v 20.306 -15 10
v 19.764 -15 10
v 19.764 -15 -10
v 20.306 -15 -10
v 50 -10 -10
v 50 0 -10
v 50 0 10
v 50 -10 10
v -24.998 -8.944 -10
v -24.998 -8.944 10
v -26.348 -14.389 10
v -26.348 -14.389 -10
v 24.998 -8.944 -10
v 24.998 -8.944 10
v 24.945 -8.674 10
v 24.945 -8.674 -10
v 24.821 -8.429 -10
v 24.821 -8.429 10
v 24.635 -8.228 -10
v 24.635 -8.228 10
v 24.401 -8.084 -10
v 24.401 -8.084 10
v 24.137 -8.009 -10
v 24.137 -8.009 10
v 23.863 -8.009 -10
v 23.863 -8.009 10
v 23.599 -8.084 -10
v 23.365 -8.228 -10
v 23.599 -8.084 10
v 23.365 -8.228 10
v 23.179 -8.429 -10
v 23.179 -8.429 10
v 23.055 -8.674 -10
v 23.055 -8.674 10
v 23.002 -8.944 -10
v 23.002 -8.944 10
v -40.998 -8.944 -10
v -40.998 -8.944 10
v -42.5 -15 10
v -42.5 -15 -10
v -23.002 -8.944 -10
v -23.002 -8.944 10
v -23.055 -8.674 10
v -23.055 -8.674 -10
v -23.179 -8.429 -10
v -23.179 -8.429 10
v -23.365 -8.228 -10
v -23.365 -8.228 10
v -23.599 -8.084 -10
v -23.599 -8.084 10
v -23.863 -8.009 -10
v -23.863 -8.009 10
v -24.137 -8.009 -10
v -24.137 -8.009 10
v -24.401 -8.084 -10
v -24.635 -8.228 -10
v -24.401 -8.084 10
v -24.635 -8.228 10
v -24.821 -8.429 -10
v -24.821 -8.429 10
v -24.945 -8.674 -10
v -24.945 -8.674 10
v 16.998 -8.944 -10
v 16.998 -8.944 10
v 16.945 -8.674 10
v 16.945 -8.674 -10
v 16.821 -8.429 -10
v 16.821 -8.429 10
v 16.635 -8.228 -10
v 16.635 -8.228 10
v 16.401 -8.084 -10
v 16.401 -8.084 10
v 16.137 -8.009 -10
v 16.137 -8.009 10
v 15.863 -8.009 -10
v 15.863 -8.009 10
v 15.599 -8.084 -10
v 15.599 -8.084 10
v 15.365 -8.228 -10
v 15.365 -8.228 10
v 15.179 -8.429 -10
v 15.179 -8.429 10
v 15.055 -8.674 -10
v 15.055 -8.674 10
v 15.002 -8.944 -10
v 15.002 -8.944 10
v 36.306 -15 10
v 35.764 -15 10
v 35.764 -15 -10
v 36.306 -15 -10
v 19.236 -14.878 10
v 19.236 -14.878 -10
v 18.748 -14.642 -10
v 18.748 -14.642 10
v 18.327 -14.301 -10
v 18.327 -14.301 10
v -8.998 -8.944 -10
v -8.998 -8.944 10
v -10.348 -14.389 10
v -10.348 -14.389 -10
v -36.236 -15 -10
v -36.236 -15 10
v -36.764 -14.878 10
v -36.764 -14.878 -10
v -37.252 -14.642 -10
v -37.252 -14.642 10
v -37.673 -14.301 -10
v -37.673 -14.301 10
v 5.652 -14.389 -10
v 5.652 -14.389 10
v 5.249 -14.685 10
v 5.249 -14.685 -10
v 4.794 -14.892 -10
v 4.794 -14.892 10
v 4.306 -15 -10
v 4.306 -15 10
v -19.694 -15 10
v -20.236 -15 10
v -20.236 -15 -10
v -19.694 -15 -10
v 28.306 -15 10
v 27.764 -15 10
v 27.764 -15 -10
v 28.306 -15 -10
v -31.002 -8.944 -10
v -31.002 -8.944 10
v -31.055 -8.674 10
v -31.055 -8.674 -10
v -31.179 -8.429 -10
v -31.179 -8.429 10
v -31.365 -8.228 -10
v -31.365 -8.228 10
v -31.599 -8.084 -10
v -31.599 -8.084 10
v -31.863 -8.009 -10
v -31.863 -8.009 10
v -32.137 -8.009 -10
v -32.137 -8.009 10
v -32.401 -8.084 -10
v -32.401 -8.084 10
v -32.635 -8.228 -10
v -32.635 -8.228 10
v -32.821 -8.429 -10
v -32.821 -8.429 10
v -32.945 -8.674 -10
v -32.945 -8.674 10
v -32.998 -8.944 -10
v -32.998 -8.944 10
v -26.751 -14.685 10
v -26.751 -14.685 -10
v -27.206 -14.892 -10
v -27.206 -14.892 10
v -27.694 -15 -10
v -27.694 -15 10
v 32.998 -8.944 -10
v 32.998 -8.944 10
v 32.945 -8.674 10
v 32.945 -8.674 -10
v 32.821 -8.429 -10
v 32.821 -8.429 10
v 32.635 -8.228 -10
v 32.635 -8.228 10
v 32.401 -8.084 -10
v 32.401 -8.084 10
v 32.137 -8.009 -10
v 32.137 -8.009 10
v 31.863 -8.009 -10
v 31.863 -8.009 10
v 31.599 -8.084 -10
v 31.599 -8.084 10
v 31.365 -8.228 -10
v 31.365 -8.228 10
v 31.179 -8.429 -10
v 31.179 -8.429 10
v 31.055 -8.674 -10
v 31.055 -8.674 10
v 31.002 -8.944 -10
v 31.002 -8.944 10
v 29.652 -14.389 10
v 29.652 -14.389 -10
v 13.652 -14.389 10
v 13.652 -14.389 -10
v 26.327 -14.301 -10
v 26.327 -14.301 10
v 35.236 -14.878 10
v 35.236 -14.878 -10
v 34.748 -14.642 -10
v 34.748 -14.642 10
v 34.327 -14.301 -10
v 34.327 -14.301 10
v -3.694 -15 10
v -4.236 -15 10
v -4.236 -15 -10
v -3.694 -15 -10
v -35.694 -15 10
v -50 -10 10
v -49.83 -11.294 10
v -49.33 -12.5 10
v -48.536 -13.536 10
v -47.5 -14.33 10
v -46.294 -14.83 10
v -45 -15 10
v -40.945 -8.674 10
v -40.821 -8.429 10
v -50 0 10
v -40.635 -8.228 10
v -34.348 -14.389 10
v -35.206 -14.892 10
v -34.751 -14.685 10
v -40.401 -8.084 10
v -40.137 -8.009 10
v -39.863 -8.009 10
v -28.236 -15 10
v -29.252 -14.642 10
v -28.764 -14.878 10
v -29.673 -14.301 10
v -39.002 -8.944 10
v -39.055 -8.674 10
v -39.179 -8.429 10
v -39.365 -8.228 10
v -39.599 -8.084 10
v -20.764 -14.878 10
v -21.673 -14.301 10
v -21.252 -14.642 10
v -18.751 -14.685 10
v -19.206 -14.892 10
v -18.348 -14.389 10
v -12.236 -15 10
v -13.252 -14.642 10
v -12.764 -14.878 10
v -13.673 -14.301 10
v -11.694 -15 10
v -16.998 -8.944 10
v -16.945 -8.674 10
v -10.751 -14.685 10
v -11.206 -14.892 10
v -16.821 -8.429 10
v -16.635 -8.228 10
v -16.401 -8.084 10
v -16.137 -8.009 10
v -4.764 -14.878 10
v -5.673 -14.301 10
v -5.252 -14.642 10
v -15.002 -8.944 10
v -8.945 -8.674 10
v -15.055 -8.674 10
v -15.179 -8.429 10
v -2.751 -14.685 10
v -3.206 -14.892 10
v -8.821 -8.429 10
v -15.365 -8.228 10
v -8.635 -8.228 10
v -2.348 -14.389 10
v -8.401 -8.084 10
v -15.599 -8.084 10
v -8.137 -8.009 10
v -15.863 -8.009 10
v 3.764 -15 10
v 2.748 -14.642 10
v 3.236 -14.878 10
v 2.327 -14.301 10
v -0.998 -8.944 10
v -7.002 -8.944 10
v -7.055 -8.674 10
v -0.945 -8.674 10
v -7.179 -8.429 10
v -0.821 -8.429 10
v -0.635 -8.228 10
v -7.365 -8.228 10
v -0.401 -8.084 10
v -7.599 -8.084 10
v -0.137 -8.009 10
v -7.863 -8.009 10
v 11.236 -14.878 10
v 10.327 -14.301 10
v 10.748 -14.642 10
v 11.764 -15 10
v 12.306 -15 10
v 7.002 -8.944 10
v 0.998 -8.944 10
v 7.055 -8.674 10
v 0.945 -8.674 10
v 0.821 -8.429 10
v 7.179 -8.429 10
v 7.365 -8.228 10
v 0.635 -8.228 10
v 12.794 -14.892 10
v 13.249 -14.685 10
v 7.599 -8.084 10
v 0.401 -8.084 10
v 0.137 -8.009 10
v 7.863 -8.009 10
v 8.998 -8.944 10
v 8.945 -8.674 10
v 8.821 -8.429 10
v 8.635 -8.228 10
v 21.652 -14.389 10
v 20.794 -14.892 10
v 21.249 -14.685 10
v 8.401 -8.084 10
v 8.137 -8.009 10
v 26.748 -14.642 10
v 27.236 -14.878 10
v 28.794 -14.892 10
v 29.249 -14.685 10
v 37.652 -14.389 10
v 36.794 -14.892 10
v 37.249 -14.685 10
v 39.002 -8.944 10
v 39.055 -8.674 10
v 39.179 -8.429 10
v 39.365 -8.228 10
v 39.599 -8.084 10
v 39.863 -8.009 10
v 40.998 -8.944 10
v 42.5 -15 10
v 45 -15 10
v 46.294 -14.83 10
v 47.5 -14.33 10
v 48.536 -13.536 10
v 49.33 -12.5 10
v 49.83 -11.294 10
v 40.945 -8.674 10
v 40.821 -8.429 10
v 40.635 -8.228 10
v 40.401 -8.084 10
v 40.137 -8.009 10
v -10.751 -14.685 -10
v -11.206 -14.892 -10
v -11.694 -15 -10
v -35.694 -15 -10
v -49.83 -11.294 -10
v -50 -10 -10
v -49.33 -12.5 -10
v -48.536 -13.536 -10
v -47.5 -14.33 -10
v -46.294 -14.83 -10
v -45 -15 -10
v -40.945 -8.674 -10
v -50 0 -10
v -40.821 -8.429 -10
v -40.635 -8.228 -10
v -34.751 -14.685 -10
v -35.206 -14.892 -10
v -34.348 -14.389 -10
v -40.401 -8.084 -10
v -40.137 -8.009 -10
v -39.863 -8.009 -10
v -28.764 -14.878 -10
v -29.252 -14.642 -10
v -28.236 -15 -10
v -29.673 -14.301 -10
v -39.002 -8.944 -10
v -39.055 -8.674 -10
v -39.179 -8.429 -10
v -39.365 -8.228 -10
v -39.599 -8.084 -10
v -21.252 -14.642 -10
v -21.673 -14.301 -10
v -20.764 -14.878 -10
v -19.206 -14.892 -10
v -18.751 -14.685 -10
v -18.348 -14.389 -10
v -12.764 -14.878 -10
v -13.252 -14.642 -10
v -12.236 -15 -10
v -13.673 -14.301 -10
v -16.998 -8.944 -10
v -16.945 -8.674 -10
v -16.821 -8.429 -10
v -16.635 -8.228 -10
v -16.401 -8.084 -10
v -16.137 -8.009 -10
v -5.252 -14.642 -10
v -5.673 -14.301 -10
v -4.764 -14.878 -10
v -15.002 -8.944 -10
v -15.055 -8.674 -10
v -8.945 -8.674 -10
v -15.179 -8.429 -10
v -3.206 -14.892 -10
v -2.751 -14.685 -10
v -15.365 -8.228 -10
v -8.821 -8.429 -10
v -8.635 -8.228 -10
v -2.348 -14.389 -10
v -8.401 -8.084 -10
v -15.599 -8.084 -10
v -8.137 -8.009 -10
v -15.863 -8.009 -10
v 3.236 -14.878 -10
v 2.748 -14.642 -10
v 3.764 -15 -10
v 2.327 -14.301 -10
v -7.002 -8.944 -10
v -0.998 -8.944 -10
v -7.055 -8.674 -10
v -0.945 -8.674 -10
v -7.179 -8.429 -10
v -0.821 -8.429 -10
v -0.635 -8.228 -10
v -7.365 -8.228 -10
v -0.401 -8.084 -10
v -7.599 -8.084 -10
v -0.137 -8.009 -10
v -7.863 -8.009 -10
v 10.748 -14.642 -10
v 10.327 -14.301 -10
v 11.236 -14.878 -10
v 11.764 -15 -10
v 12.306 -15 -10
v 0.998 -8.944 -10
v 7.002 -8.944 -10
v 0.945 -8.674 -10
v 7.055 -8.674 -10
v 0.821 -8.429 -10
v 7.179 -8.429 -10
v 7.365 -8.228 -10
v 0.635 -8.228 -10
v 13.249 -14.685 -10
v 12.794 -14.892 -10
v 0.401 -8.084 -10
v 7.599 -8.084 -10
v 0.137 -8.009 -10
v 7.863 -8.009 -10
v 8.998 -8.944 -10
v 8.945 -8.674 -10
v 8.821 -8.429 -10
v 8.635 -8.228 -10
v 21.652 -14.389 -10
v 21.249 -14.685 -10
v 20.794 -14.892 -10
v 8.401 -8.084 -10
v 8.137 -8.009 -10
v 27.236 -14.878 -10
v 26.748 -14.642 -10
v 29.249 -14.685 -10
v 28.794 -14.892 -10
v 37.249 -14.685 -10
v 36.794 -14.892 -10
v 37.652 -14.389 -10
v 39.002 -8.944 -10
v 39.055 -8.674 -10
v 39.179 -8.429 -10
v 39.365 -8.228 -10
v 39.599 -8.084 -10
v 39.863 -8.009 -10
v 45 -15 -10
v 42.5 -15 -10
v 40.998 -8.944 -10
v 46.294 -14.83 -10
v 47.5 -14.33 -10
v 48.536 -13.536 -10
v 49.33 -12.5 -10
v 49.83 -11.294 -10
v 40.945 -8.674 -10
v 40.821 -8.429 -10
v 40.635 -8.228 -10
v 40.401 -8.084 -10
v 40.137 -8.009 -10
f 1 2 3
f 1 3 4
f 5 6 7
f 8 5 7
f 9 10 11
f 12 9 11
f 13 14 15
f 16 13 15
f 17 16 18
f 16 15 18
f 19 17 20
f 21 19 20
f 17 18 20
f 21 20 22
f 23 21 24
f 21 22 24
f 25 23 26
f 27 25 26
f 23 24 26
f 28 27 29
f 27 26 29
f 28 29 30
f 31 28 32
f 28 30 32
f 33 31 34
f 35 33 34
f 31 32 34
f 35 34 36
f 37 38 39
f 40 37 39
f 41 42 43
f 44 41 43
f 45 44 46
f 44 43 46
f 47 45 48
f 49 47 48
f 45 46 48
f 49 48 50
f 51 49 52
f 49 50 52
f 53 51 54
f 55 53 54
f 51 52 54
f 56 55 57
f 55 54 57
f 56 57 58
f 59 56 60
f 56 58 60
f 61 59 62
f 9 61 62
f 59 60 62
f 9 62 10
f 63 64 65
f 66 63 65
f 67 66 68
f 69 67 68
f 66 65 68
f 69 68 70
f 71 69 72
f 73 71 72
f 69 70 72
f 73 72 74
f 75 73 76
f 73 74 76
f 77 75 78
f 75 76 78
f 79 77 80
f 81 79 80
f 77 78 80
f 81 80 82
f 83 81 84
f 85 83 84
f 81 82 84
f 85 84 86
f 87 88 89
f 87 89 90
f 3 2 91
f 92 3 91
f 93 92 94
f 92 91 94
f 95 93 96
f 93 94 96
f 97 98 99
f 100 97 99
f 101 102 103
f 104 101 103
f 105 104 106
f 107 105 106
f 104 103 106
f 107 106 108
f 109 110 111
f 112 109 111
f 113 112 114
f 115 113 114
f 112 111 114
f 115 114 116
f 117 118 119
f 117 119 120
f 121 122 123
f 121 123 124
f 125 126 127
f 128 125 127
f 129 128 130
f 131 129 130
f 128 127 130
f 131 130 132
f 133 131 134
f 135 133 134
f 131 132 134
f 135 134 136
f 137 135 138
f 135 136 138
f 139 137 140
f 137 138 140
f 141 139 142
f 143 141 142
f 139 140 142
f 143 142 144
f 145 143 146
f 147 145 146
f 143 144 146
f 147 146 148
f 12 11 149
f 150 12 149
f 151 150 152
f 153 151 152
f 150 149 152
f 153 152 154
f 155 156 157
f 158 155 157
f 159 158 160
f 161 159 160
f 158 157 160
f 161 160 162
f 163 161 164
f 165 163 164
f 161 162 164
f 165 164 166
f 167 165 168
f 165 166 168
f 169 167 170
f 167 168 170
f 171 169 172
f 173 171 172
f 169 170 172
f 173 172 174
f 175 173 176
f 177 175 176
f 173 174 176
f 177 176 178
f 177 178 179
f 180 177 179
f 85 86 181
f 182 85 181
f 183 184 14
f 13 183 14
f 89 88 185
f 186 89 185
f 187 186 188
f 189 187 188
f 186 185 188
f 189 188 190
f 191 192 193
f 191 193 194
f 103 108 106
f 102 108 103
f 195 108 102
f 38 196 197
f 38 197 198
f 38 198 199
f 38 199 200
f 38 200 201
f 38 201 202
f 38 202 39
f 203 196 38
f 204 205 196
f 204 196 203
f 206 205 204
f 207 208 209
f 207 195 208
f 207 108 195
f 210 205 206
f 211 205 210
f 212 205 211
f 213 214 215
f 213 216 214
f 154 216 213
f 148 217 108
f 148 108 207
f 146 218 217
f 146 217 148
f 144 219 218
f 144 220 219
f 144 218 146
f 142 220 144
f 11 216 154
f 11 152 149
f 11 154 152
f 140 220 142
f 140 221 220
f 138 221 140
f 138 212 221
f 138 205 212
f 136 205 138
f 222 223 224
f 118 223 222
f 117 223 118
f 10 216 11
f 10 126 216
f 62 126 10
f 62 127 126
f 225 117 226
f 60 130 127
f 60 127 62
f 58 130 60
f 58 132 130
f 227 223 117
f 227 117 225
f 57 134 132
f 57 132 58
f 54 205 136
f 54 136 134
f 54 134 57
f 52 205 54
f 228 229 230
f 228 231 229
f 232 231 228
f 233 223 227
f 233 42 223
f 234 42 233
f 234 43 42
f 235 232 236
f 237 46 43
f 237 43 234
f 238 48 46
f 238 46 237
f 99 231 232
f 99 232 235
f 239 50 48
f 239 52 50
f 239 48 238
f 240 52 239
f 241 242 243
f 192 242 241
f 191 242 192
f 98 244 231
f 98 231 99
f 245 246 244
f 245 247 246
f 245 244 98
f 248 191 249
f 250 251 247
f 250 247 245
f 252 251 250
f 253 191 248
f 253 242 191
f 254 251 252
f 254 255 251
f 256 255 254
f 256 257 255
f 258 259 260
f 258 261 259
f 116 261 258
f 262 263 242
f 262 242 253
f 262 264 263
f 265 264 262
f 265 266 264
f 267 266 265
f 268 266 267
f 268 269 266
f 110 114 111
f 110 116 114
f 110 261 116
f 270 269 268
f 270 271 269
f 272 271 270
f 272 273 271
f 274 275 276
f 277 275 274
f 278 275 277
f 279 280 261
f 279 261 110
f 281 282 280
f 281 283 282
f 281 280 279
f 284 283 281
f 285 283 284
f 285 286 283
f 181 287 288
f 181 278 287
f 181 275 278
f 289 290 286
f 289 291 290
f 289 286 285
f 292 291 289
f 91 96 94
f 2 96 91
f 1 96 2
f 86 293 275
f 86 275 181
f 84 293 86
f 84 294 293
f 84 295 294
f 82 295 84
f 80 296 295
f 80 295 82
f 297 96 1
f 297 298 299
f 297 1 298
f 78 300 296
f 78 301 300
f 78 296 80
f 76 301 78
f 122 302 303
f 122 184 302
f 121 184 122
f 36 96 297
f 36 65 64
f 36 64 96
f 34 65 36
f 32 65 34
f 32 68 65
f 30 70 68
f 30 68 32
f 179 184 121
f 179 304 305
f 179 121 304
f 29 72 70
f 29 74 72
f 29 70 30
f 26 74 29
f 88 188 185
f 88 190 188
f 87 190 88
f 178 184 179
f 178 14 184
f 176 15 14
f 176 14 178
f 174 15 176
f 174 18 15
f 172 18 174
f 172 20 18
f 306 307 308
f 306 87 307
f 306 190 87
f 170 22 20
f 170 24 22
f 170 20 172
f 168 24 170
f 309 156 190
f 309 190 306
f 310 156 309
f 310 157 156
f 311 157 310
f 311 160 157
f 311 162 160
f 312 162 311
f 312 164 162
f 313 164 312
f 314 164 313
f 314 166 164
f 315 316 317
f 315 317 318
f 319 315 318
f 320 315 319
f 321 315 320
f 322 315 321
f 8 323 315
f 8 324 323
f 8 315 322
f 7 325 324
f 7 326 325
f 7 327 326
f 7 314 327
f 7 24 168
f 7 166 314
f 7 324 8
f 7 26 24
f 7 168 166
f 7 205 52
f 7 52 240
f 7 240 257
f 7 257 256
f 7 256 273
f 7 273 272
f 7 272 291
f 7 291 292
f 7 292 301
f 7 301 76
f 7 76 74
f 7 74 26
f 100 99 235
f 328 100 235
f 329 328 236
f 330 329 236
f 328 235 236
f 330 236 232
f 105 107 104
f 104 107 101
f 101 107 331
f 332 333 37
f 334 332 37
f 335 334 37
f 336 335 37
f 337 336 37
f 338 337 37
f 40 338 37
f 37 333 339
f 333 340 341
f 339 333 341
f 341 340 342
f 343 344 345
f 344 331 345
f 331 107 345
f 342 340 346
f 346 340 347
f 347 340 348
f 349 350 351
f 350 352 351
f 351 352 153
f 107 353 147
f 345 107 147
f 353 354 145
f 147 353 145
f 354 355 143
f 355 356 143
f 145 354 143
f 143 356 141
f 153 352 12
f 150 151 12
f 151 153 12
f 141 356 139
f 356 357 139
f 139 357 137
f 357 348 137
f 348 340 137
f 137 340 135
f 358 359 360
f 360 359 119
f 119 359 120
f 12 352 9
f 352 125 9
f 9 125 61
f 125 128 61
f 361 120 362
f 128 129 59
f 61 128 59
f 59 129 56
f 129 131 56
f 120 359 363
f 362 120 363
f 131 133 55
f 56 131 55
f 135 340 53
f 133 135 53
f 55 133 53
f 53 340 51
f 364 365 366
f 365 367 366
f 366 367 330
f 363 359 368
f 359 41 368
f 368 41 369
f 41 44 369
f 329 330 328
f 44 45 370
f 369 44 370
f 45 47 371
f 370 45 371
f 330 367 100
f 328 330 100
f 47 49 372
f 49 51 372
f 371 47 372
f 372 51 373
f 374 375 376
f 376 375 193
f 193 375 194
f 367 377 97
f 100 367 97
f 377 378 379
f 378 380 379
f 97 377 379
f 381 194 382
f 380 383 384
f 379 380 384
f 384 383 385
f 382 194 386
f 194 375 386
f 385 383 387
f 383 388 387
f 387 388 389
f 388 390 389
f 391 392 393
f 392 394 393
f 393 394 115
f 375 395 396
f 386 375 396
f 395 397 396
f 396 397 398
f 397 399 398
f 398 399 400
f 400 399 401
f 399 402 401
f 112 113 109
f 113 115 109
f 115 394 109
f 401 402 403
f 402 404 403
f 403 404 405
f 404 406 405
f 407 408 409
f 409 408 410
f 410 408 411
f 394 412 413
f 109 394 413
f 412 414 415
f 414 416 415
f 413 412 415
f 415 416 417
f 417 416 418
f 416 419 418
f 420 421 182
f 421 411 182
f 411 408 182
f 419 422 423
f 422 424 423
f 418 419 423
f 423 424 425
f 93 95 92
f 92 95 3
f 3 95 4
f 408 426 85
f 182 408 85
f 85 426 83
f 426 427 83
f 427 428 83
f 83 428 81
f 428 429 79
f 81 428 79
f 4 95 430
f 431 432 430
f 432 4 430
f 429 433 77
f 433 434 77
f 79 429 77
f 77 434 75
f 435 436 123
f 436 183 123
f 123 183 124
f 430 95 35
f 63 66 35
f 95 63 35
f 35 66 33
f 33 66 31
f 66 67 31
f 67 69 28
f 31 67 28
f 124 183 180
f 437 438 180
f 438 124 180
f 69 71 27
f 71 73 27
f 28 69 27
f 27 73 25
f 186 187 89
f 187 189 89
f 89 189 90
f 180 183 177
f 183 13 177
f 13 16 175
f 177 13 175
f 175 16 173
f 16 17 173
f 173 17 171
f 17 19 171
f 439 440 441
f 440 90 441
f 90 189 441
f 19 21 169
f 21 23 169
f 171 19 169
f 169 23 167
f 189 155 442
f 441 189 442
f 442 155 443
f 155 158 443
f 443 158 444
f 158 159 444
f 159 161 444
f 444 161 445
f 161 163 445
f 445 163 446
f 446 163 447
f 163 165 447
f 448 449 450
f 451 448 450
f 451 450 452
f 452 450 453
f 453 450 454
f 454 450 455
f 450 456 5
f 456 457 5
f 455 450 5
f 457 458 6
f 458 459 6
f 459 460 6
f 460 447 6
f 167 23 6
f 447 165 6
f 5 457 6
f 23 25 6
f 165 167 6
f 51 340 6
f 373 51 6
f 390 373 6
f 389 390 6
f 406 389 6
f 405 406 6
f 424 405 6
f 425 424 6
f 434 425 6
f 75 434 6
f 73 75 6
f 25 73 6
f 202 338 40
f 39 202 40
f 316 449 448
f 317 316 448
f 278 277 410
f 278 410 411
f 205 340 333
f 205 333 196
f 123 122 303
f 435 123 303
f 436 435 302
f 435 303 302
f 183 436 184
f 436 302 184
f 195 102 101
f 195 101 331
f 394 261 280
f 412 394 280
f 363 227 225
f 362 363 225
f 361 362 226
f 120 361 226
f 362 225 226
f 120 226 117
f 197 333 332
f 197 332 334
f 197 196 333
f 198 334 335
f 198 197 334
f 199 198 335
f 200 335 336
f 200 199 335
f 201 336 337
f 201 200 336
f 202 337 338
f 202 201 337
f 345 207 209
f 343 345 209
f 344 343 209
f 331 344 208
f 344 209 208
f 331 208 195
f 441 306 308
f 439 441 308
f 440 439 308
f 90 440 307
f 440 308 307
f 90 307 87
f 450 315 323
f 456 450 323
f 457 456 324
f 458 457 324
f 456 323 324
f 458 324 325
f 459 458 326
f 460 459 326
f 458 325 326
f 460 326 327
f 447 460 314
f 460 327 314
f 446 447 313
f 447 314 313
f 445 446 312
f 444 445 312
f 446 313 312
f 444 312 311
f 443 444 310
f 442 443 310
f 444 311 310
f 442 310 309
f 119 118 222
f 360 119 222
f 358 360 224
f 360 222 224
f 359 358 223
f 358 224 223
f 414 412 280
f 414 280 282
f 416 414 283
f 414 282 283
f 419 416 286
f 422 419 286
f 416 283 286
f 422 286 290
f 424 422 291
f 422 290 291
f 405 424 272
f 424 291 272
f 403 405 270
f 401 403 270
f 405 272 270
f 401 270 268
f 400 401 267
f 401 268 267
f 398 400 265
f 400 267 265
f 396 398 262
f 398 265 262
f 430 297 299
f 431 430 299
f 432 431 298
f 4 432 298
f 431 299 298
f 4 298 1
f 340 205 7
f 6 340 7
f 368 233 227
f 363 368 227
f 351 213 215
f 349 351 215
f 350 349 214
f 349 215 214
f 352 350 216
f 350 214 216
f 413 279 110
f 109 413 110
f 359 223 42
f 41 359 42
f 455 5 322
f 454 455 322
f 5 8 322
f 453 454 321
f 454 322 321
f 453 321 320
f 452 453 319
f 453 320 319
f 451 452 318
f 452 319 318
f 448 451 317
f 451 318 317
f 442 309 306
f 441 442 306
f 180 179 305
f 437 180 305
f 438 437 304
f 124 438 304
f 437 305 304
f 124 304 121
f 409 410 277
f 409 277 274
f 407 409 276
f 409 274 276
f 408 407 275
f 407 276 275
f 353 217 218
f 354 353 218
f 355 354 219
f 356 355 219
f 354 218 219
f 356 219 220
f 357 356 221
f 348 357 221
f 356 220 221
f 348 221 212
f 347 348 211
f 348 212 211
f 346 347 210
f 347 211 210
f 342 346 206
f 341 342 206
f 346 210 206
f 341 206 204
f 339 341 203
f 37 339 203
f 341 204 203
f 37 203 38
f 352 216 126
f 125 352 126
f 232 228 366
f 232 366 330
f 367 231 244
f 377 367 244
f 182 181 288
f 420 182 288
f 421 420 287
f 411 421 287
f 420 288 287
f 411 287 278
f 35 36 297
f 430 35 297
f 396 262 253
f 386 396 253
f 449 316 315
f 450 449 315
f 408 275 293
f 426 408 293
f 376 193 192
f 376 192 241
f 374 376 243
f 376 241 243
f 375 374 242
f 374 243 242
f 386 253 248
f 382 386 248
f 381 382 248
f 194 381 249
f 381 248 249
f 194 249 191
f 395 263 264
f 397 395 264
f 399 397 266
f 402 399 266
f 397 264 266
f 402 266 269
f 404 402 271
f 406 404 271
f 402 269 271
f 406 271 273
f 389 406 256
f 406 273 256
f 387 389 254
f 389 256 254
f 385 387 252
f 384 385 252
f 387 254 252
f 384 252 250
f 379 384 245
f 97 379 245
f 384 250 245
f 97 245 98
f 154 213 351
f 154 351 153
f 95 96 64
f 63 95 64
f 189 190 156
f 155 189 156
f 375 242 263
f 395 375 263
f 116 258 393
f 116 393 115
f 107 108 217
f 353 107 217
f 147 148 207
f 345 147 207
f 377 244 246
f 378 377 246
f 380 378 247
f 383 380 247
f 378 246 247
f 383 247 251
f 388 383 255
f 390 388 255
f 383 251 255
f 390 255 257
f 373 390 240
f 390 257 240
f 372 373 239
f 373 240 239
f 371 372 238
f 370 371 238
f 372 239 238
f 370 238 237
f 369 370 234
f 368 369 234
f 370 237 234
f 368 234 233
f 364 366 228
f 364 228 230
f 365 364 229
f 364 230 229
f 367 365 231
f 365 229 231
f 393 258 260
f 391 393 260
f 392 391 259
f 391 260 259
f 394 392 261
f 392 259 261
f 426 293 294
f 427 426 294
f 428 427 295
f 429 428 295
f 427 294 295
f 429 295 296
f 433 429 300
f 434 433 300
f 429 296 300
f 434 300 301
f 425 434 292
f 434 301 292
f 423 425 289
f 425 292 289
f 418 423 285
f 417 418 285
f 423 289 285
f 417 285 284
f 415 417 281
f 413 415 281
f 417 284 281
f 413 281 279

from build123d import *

# Parameters (mm, degrees)
F0_W     = 100
F0_H     = 20
F1_DEPTH = 15
F3_DEPTH = 20
F4_R     = 5


with BuildPart() as f1:
    # F0 (on Front) → F1 (new body)
    with BuildSketch(Plane.XZ):
        Rectangle(F0_W, F0_H)
    extrude(amount=F1_DEPTH)

    # F2 (on face) → F3 (cut, through all)
    with BuildSketch(Plane.XY.offset(10)):
        with BuildLine():
            Line((-37.5, -15), (-37.673208, -14.301388))
            Line((-37.673208, -14.301388), (-39.001597, -8.943505))
            ThreePointArc((-39.001597, -8.943505), (-40, -8), (-40.998403, -8.943505))
            Line((-40.998403, -8.943505), (-42.5, -15))
            Line((-42.5, -15), (-37.5, -15))
        make_face()
        with BuildLine():
            Line((-29.5, -15), (-29.673208, -14.301388))
            Line((-29.673208, -14.301388), (-31.001597, -8.943505))
            ThreePointArc((-31.001597, -8.943505), (-32, -8), (-32.998403, -8.943505))
            Line((-32.998403, -8.943505), (-34.348484, -14.388879))
            Line((-34.348484, -14.388879), (-34.5, -15))
            Line((-34.5, -15), (-29.5, -15))
        make_face()
        with BuildLine():
            Line((-21.5, -15), (-21.673208, -14.301388))
            Line((-21.673208, -14.301388), (-23.001597, -8.943505))
            ThreePointArc((-23.001597, -8.943505), (-24, -8), (-24.998403, -8.943505))
            Line((-24.998403, -8.943505), (-26.348484, -14.388879))
            Line((-26.348484, -14.388879), (-26.5, -15))
            Line((-26.5, -15), (-21.5, -15))
        make_face()
        with BuildLine():
            Line((-13.5, -15), (-13.673208, -14.301388))
            Line((-13.673208, -14.301388), (-15.001597, -8.943505))
            ThreePointArc((-15.001597, -8.943505), (-16, -8), (-16.998403, -8.943505))
            Line((-16.998403, -8.943505), (-18.348484, -14.388879))
            Line((-18.348484, -14.388879), (-18.5, -15))
            Line((-18.5, -15), (-13.5, -15))
        make_face()
        with BuildLine():
            Line((-5.5, -15), (-5.673208, -14.301388))
            Line((-5.673208, -14.301388), (-7.001597, -8.943505))
            ThreePointArc((-7.001597, -8.943505), (-8, -8), (-8.998403, -8.943505))
            Line((-8.998403, -8.943505), (-10.348484, -14.388879))
            Line((-10.348484, -14.388879), (-10.5, -15))
            Line((-10.5, -15), (-5.5, -15))
        make_face()
        with BuildLine():
            Line((2.326792, -14.301388), (0.998403, -8.943505))
            ThreePointArc((0.998403, -8.943505), (0, -8), (-0.998403, -8.943505))
            Line((-0.998403, -8.943505), (-2.348484, -14.388879))
            Line((-2.348484, -14.388879), (-2.5, -15))
            Line((-2.5, -15), (2.5, -15))
            Line((2.5, -15), (2.326792, -14.301388))
        make_face()
        with BuildLine():
            Line((7.001597, -8.943505), (5.651516, -14.388879))
            Line((5.651516, -14.388879), (5.5, -15))
            Line((5.5, -15), (10.5, -15))
            Line((10.5, -15), (10.326792, -14.301388))
            Line((10.326792, -14.301388), (8.998403, -8.943505))
            ThreePointArc((8.998403, -8.943505), (8, -8), (7.001597, -8.943505))
        make_face()
        with BuildLine():
            Line((15.001597, -8.943505), (13.651516, -14.388879))
            Line((13.651516, -14.388879), (13.5, -15))
            Line((13.5, -15), (18.5, -15))
            Line((18.5, -15), (18.326792, -14.301388))
            Line((18.326792, -14.301388), (16.998403, -8.943505))
            ThreePointArc((16.998403, -8.943505), (16, -8), (15.001597, -8.943505))
        make_face()
        with BuildLine():
            Line((23.001597, -8.943505), (21.651516, -14.388879))
            Line((21.651516, -14.388879), (21.5, -15))
            Line((21.5, -15), (26.5, -15))
            Line((26.5, -15), (26.326792, -14.301388))
            Line((26.326792, -14.301388), (24.998403, -8.943505))
            ThreePointArc((24.998403, -8.943505), (24, -8), (23.001597, -8.943505))
        make_face()
        with BuildLine():
            Line((31.001597, -8.943505), (29.651516, -14.388879))
            Line((29.651516, -14.388879), (29.5, -15))
            Line((29.5, -15), (34.5, -15))
            Line((34.5, -15), (34.326792, -14.301388))
            Line((34.326792, -14.301388), (32.998403, -8.943505))
            ThreePointArc((32.998403, -8.943505), (32, -8), (31.001597, -8.943505))
        make_face()
        with BuildLine():
            Line((39.001597, -8.943505), (37.651516, -14.388879))
            Line((37.651516, -14.388879), (37.5, -15))
            Line((37.5, -15), (42.5, -15))
            Line((42.5, -15), (40.998403, -8.943505))
            ThreePointArc((40.998403, -8.943505), (40, -8), (39.001597, -8.943505))
        make_face()
        with BuildLine():
            ThreePointArc((13.651516, -14.388879), (13.026891, -14.800623), (12.305824, -15))
            Line((12.305824, -15), (13.5, -15))
            Line((13.5, -15), (13.651516, -14.388879))
        make_face()
        with BuildLine():
            Line((10.326792, -14.301388), (10.5, -15))
            Line((10.5, -15), (11.763503, -15))
            ThreePointArc((11.763503, -15), (10.985304, -14.773765), (10.326792, -14.301388))
        make_face()
        with BuildLine():
            Line((18.326792, -14.301388), (18.5, -15))
            Line((18.5, -15), (19.763503, -15))
            ThreePointArc((19.763503, -15), (18.985304, -14.773765), (18.326792, -14.301388))
        make_face()
        with BuildLine():
            ThreePointArc((21.651516, -14.388879), (21.026891, -14.800623), (20.305824, -15))
            Line((20.305824, -15), (21.5, -15))
            Line((21.5, -15), (21.651516, -14.388879))
        make_face()
        with BuildLine():
            Line((26.326792, -14.301388), (26.5, -15))
            Line((26.5, -15), (27.763503, -15))
            ThreePointArc((27.763503, -15), (26.985304, -14.773765), (26.326792, -14.301388))
        make_face()
        with BuildLine():
            ThreePointArc((29.651516, -14.388879), (29.026891, -14.800623), (28.305824, -15))
            Line((28.305824, -15), (29.5, -15))
            Line((29.5, -15), (29.651516, -14.388879))
        make_face()
        with BuildLine():
            Line((34.326792, -14.301388), (34.5, -15))
            Line((34.5, -15), (35.763503, -15))
            ThreePointArc((35.763503, -15), (34.985304, -14.773765), (34.326792, -14.301388))
        make_face()
        with BuildLine():
            ThreePointArc((37.651516, -14.388879), (37.026891, -14.800623), (36.305824, -15))
            Line((36.305824, -15), (37.5, -15))
            Line((37.5, -15), (37.651516, -14.388879))
        make_face()
        with BuildLine():
            ThreePointArc((5.651516, -14.388879), (5.026891, -14.800623), (4.305824, -15))
            Line((4.305824, -15), (5.5, -15))
            Line((5.5, -15), (5.651516, -14.388879))
        make_face()
        with BuildLine():
            ThreePointArc((3.763503, -15), (2.985304, -14.773765), (2.326792, -14.301388))
            Line((2.326792, -14.301388), (2.5, -15))
            Line((2.5, -15), (3.763503, -15))
        make_face()
        with BuildLine():
            Line((-2.5, -15), (-2.348484, -14.388879))
            ThreePointArc((-2.348484, -14.388879), (-2.973109, -14.800623), (-3.694176, -15))
            Line((-3.694176, -15), (-2.5, -15))
        make_face()
        with BuildLine():
            Line((-5.5, -15), (-4.236497, -15))
            ThreePointArc((-4.236497, -15), (-5.014696, -14.773765), (-5.673208, -14.301388))
            Line((-5.673208, -14.301388), (-5.5, -15))
        make_face()
        with BuildLine():
            Line((-11.694176, -15), (-10.5, -15))
            Line((-10.5, -15), (-10.348484, -14.388879))
            ThreePointArc((-10.348484, -14.388879), (-10.973109, -14.800623), (-11.694176, -15))
        make_face()
        with BuildLine():
            Line((-13.5, -15), (-12.236497, -15))
            ThreePointArc((-12.236497, -15), (-13.014696, -14.773765), (-13.673208, -14.301388))
            Line((-13.673208, -14.301388), (-13.5, -15))
        make_face()
        with BuildLine():
            Line((-19.694176, -15), (-18.5, -15))
            Line((-18.5, -15), (-18.348484, -14.388879))
            ThreePointArc((-18.348484, -14.388879), (-18.973109, -14.800623), (-19.694176, -15))
        make_face()
        with BuildLine():
            Line((-21.5, -15), (-20.236497, -15))
            ThreePointArc((-20.236497, -15), (-21.014696, -14.773765), (-21.673208, -14.301388))
            Line((-21.673208, -14.301388), (-21.5, -15))
        make_face()
        with BuildLine():
            Line((-27.694176, -15), (-26.5, -15))
            Line((-26.5, -15), (-26.348484, -14.388879))
            ThreePointArc((-26.348484, -14.388879), (-26.973109, -14.800623), (-27.694176, -15))
        make_face()
        with BuildLine():
            Line((-29.5, -15), (-28.236497, -15))
            ThreePointArc((-28.236497, -15), (-29.014696, -14.773765), (-29.673208, -14.301388))
            Line((-29.673208, -14.301388), (-29.5, -15))
        make_face()
        with BuildLine():
            Line((-35.694176, -15), (-34.5, -15))
            Line((-34.5, -15), (-34.348484, -14.388879))
            ThreePointArc((-34.348484, -14.388879), (-34.973109, -14.800623), (-35.694176, -15))
        make_face()
        with BuildLine():
            Line((-37.5, -15), (-36.236497, -15))
            ThreePointArc((-36.236497, -15), (-37.014696, -14.773765), (-37.673208, -14.301388))
            Line((-37.673208, -14.301388), (-37.5, -15))
        make_face()
    extrude(amount=-F3_DEPTH, mode=Mode.SUBTRACT)

    # F4
    f4_edges = [f1.edges().sort_by_distance(p)[0] for p in [
        (-50, -15, 0),
        (50, -15, 0),
    ]]
    fillet(f4_edges, radius=F4_R)


solid = f1.part
